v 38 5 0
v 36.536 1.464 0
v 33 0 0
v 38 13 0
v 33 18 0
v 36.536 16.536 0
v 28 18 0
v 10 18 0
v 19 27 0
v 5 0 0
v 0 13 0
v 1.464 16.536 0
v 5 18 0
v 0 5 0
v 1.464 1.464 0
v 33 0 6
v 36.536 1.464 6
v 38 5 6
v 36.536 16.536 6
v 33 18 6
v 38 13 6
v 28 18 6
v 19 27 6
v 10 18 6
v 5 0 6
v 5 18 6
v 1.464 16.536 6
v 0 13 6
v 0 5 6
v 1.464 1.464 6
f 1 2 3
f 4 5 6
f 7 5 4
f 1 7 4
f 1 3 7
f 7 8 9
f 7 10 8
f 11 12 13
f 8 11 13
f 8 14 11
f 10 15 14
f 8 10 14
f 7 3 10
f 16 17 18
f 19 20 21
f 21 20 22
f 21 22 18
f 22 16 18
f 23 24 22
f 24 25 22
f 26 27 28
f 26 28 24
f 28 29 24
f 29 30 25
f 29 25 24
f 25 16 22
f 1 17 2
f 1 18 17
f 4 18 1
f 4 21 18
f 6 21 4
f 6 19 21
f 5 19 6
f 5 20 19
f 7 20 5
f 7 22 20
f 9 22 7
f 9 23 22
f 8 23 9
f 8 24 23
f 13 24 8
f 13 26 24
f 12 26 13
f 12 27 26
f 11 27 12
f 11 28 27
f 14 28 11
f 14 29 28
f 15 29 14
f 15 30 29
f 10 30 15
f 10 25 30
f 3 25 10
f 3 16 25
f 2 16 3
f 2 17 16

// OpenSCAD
$fn = 32;

// ----------------------------------------------------------------------
// Ratchet pawl: 38 x 18 mm body, beak 9 mm сверху
// ----------------------------------------------------------------------

// --- parameters (mm) ---
profile_height = 6;       // extrusion height
profile_points = 15;      // points of the closed outline

profile = [[0, 5], [1.464, 1.464], [5, 0], [33, 0], [36.536, 1.464], [38, 5], [38, 13], [36.536, 16.536], [33, 18], [28, 18], [19, 27], [10, 18], [5, 18], [1.464, 16.536], [0, 13]];  // single closed polygon, 15 points, counter clockwise

// --- the one profile operation ---
linear_extrude(height = profile_height) polygon(points = profile);
